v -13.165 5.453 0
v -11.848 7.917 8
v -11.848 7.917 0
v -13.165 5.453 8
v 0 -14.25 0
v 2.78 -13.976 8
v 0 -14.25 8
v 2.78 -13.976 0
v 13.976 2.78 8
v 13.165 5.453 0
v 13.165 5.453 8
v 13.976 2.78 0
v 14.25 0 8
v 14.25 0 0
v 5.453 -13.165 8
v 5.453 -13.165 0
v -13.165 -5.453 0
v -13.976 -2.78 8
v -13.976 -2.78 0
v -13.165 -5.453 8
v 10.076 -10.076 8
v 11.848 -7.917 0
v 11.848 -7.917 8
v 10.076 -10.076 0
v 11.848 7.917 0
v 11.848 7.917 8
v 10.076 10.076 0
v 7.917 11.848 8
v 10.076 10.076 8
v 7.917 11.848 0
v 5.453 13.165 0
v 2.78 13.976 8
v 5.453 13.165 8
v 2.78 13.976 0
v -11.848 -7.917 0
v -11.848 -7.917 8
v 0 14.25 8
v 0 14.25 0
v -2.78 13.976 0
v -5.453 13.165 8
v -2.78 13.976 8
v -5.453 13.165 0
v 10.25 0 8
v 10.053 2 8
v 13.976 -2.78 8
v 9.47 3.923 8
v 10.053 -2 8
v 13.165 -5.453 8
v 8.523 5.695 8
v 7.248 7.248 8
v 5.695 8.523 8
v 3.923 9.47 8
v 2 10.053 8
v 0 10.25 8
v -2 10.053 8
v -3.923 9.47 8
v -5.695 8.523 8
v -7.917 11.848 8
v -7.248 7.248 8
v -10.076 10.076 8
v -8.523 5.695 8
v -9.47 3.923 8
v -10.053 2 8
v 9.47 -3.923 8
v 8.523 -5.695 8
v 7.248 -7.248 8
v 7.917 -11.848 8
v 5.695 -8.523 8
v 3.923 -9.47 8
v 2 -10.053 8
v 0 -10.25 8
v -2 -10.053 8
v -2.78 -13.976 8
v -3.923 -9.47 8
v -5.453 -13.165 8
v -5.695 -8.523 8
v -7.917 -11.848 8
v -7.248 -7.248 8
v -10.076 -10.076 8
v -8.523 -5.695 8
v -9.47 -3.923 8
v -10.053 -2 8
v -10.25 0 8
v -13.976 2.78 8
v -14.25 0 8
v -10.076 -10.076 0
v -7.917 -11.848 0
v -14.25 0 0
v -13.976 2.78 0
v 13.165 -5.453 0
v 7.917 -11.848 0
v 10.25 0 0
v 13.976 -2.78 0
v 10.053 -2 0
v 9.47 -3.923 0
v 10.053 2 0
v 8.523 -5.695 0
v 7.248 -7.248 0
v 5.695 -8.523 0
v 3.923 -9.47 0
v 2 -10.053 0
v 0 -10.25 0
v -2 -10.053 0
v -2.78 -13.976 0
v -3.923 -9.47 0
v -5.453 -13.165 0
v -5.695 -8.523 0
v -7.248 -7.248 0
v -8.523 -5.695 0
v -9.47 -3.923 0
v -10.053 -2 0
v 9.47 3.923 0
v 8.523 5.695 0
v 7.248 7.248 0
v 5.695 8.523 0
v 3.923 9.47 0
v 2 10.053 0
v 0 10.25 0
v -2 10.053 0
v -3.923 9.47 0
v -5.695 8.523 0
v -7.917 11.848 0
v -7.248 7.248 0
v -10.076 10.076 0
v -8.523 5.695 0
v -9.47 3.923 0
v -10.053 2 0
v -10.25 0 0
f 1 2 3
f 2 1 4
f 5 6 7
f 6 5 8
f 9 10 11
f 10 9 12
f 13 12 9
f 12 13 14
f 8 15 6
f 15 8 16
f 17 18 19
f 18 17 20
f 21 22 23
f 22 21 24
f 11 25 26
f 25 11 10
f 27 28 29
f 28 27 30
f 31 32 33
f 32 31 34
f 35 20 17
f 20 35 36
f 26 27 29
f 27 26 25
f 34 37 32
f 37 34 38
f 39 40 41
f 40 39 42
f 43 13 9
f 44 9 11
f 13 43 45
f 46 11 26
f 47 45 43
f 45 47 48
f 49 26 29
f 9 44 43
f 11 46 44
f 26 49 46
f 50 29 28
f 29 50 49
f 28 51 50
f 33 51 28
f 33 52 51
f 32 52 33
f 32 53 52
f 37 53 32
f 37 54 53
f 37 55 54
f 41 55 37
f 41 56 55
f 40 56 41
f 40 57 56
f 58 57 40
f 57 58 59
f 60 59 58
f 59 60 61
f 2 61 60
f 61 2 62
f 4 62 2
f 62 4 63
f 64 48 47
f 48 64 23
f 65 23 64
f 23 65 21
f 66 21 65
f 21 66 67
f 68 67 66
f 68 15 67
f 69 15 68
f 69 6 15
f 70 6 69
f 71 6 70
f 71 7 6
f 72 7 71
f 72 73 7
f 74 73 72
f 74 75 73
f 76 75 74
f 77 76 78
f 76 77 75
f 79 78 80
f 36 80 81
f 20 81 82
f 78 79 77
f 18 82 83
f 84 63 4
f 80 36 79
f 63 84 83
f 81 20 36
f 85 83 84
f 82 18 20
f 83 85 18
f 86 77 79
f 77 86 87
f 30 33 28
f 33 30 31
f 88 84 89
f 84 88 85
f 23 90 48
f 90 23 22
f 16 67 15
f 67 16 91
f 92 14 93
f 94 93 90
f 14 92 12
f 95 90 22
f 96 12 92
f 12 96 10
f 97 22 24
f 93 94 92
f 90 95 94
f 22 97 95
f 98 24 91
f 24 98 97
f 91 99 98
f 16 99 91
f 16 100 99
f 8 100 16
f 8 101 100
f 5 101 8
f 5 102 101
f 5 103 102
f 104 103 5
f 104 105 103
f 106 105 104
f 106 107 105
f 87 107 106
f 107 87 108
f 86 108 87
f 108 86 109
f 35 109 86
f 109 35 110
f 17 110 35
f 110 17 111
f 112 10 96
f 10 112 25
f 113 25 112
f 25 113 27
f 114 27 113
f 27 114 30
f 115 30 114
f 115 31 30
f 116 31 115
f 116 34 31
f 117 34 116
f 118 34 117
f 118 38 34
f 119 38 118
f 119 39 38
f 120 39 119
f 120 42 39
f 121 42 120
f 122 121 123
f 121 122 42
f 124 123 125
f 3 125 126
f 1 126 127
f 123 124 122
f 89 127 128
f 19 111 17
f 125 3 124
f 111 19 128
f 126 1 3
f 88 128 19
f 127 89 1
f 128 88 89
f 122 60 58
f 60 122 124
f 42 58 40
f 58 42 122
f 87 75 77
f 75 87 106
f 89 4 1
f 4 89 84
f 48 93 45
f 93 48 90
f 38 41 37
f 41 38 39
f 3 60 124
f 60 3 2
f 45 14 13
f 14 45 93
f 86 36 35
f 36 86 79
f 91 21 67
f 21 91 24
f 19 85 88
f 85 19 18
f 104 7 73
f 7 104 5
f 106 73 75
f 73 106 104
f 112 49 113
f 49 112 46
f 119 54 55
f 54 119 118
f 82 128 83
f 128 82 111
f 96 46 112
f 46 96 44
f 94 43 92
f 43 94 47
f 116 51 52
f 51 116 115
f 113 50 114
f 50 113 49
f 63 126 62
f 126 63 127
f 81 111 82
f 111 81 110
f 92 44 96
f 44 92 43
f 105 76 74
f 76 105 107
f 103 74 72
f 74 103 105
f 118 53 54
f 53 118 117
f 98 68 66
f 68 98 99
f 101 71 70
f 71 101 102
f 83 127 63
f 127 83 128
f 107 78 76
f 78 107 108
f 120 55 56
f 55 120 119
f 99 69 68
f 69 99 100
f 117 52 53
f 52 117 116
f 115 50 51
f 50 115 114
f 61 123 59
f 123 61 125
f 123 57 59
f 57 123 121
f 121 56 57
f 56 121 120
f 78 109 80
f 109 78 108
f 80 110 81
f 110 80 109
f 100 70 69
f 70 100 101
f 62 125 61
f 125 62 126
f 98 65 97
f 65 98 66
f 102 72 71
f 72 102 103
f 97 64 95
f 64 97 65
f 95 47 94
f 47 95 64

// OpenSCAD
$fn = 32;

// ----------------------------------------------------------------------
// Spacer sleeve: 28.5 / 20.5 x 8 mm
// ----------------------------------------------------------------------

// --- parameters (mm) ---
sleeve_od = 28.5;         // outside diameter
sleeve_id = 20.5;         // shaft bore
sleeve_l = 8;             // sleeve length

module sleeve() {
  cylinder(h = sleeve_l, d = sleeve_od);
}

difference() {
  sleeve();
  translate([0, 0, -1]) cylinder(h = sleeve_l + 2, d = sleeve_id);
}
